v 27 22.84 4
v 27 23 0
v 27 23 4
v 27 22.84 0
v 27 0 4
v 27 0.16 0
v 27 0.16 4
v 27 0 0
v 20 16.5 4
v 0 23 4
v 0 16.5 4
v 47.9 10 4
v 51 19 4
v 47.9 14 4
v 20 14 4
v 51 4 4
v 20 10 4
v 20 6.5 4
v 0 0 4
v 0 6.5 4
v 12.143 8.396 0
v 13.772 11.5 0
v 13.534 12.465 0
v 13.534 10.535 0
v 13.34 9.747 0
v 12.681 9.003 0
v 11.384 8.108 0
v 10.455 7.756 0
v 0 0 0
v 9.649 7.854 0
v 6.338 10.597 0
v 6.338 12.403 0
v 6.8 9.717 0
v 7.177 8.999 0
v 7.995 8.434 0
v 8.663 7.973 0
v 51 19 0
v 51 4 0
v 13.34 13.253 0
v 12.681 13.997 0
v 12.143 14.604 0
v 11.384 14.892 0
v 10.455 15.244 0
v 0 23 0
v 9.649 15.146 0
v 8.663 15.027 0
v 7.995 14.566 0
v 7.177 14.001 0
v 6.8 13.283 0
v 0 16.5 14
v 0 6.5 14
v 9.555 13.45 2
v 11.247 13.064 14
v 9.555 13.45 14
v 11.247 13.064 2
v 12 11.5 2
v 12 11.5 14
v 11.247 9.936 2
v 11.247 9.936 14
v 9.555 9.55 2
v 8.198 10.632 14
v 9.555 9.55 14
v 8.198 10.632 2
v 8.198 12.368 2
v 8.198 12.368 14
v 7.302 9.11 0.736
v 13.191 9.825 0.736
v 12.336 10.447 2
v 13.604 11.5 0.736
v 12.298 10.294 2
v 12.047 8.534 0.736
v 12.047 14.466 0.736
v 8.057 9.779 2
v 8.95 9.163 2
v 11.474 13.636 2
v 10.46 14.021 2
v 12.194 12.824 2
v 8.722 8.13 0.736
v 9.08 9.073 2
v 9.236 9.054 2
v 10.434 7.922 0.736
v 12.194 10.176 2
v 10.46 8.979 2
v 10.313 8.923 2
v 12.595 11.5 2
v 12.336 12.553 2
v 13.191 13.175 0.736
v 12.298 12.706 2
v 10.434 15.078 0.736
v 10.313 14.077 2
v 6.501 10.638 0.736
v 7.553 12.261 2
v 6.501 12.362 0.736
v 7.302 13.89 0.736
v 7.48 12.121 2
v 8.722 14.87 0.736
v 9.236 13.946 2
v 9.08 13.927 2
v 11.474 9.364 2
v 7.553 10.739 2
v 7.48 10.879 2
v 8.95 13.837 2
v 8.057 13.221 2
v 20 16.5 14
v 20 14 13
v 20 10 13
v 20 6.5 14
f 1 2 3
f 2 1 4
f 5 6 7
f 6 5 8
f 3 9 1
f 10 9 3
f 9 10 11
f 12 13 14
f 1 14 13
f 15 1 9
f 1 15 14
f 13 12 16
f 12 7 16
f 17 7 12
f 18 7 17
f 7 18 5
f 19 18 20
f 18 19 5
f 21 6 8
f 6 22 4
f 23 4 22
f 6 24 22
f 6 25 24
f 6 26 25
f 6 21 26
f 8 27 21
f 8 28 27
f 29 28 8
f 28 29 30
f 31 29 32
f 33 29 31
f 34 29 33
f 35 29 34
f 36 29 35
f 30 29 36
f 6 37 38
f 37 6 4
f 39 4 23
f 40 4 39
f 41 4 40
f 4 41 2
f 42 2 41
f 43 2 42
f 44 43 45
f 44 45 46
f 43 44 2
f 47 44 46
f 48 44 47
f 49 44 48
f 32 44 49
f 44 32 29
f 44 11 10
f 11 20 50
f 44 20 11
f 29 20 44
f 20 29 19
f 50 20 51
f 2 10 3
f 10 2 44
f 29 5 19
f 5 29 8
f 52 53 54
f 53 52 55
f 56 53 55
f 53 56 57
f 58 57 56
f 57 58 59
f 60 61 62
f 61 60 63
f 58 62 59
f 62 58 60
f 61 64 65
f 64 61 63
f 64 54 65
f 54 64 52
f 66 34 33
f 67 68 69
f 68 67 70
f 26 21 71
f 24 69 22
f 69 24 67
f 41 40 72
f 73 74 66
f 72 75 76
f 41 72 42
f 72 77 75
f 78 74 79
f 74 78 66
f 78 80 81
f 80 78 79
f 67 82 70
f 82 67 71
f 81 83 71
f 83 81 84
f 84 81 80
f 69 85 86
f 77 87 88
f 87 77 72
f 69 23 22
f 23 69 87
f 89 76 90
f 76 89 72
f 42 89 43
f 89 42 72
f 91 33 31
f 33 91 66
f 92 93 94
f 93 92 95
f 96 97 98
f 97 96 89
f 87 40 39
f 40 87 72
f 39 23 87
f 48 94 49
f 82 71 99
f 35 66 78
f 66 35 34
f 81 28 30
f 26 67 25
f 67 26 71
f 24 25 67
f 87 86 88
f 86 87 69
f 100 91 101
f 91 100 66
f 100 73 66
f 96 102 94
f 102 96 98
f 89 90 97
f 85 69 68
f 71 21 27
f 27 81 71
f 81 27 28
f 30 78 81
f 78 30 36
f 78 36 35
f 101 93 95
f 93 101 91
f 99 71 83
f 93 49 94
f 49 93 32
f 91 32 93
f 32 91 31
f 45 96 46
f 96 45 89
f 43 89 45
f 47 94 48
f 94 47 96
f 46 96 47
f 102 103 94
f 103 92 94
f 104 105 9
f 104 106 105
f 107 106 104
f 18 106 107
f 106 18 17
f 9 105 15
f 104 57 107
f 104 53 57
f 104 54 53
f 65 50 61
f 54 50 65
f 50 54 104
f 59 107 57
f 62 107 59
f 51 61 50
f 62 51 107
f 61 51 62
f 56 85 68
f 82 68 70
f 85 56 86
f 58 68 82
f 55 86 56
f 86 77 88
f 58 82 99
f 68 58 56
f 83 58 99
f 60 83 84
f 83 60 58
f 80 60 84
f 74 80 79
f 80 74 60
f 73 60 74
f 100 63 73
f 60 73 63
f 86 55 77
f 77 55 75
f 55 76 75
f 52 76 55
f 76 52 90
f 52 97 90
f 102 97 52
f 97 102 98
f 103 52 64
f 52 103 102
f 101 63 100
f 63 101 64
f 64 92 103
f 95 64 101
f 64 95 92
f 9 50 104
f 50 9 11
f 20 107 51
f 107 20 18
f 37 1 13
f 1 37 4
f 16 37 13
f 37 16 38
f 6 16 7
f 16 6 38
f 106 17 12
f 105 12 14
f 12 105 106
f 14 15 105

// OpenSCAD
difference() {
   cube([27,23,4]);
   translate([10,11.5,-1]) cylinder (h=17,r=2);
   translate([10,11.5,-1]) sphere (h,r=4);
}

hull() {
translate([20,0,0]) cube([6,23,4]);
translate([26,4,0]) cube([25,15,4]);
}

difference() {
   translate([0,6.5,2]) cube ([20,10,12]);
   translate([10,11.5,-1]) cylinder (h=17,r=2);
}
translate([20,10,3]) rotate([90,270,180])  linear_extrude(height = 4) polygon(points=[[0,0],[0,31],[10,0]]);
